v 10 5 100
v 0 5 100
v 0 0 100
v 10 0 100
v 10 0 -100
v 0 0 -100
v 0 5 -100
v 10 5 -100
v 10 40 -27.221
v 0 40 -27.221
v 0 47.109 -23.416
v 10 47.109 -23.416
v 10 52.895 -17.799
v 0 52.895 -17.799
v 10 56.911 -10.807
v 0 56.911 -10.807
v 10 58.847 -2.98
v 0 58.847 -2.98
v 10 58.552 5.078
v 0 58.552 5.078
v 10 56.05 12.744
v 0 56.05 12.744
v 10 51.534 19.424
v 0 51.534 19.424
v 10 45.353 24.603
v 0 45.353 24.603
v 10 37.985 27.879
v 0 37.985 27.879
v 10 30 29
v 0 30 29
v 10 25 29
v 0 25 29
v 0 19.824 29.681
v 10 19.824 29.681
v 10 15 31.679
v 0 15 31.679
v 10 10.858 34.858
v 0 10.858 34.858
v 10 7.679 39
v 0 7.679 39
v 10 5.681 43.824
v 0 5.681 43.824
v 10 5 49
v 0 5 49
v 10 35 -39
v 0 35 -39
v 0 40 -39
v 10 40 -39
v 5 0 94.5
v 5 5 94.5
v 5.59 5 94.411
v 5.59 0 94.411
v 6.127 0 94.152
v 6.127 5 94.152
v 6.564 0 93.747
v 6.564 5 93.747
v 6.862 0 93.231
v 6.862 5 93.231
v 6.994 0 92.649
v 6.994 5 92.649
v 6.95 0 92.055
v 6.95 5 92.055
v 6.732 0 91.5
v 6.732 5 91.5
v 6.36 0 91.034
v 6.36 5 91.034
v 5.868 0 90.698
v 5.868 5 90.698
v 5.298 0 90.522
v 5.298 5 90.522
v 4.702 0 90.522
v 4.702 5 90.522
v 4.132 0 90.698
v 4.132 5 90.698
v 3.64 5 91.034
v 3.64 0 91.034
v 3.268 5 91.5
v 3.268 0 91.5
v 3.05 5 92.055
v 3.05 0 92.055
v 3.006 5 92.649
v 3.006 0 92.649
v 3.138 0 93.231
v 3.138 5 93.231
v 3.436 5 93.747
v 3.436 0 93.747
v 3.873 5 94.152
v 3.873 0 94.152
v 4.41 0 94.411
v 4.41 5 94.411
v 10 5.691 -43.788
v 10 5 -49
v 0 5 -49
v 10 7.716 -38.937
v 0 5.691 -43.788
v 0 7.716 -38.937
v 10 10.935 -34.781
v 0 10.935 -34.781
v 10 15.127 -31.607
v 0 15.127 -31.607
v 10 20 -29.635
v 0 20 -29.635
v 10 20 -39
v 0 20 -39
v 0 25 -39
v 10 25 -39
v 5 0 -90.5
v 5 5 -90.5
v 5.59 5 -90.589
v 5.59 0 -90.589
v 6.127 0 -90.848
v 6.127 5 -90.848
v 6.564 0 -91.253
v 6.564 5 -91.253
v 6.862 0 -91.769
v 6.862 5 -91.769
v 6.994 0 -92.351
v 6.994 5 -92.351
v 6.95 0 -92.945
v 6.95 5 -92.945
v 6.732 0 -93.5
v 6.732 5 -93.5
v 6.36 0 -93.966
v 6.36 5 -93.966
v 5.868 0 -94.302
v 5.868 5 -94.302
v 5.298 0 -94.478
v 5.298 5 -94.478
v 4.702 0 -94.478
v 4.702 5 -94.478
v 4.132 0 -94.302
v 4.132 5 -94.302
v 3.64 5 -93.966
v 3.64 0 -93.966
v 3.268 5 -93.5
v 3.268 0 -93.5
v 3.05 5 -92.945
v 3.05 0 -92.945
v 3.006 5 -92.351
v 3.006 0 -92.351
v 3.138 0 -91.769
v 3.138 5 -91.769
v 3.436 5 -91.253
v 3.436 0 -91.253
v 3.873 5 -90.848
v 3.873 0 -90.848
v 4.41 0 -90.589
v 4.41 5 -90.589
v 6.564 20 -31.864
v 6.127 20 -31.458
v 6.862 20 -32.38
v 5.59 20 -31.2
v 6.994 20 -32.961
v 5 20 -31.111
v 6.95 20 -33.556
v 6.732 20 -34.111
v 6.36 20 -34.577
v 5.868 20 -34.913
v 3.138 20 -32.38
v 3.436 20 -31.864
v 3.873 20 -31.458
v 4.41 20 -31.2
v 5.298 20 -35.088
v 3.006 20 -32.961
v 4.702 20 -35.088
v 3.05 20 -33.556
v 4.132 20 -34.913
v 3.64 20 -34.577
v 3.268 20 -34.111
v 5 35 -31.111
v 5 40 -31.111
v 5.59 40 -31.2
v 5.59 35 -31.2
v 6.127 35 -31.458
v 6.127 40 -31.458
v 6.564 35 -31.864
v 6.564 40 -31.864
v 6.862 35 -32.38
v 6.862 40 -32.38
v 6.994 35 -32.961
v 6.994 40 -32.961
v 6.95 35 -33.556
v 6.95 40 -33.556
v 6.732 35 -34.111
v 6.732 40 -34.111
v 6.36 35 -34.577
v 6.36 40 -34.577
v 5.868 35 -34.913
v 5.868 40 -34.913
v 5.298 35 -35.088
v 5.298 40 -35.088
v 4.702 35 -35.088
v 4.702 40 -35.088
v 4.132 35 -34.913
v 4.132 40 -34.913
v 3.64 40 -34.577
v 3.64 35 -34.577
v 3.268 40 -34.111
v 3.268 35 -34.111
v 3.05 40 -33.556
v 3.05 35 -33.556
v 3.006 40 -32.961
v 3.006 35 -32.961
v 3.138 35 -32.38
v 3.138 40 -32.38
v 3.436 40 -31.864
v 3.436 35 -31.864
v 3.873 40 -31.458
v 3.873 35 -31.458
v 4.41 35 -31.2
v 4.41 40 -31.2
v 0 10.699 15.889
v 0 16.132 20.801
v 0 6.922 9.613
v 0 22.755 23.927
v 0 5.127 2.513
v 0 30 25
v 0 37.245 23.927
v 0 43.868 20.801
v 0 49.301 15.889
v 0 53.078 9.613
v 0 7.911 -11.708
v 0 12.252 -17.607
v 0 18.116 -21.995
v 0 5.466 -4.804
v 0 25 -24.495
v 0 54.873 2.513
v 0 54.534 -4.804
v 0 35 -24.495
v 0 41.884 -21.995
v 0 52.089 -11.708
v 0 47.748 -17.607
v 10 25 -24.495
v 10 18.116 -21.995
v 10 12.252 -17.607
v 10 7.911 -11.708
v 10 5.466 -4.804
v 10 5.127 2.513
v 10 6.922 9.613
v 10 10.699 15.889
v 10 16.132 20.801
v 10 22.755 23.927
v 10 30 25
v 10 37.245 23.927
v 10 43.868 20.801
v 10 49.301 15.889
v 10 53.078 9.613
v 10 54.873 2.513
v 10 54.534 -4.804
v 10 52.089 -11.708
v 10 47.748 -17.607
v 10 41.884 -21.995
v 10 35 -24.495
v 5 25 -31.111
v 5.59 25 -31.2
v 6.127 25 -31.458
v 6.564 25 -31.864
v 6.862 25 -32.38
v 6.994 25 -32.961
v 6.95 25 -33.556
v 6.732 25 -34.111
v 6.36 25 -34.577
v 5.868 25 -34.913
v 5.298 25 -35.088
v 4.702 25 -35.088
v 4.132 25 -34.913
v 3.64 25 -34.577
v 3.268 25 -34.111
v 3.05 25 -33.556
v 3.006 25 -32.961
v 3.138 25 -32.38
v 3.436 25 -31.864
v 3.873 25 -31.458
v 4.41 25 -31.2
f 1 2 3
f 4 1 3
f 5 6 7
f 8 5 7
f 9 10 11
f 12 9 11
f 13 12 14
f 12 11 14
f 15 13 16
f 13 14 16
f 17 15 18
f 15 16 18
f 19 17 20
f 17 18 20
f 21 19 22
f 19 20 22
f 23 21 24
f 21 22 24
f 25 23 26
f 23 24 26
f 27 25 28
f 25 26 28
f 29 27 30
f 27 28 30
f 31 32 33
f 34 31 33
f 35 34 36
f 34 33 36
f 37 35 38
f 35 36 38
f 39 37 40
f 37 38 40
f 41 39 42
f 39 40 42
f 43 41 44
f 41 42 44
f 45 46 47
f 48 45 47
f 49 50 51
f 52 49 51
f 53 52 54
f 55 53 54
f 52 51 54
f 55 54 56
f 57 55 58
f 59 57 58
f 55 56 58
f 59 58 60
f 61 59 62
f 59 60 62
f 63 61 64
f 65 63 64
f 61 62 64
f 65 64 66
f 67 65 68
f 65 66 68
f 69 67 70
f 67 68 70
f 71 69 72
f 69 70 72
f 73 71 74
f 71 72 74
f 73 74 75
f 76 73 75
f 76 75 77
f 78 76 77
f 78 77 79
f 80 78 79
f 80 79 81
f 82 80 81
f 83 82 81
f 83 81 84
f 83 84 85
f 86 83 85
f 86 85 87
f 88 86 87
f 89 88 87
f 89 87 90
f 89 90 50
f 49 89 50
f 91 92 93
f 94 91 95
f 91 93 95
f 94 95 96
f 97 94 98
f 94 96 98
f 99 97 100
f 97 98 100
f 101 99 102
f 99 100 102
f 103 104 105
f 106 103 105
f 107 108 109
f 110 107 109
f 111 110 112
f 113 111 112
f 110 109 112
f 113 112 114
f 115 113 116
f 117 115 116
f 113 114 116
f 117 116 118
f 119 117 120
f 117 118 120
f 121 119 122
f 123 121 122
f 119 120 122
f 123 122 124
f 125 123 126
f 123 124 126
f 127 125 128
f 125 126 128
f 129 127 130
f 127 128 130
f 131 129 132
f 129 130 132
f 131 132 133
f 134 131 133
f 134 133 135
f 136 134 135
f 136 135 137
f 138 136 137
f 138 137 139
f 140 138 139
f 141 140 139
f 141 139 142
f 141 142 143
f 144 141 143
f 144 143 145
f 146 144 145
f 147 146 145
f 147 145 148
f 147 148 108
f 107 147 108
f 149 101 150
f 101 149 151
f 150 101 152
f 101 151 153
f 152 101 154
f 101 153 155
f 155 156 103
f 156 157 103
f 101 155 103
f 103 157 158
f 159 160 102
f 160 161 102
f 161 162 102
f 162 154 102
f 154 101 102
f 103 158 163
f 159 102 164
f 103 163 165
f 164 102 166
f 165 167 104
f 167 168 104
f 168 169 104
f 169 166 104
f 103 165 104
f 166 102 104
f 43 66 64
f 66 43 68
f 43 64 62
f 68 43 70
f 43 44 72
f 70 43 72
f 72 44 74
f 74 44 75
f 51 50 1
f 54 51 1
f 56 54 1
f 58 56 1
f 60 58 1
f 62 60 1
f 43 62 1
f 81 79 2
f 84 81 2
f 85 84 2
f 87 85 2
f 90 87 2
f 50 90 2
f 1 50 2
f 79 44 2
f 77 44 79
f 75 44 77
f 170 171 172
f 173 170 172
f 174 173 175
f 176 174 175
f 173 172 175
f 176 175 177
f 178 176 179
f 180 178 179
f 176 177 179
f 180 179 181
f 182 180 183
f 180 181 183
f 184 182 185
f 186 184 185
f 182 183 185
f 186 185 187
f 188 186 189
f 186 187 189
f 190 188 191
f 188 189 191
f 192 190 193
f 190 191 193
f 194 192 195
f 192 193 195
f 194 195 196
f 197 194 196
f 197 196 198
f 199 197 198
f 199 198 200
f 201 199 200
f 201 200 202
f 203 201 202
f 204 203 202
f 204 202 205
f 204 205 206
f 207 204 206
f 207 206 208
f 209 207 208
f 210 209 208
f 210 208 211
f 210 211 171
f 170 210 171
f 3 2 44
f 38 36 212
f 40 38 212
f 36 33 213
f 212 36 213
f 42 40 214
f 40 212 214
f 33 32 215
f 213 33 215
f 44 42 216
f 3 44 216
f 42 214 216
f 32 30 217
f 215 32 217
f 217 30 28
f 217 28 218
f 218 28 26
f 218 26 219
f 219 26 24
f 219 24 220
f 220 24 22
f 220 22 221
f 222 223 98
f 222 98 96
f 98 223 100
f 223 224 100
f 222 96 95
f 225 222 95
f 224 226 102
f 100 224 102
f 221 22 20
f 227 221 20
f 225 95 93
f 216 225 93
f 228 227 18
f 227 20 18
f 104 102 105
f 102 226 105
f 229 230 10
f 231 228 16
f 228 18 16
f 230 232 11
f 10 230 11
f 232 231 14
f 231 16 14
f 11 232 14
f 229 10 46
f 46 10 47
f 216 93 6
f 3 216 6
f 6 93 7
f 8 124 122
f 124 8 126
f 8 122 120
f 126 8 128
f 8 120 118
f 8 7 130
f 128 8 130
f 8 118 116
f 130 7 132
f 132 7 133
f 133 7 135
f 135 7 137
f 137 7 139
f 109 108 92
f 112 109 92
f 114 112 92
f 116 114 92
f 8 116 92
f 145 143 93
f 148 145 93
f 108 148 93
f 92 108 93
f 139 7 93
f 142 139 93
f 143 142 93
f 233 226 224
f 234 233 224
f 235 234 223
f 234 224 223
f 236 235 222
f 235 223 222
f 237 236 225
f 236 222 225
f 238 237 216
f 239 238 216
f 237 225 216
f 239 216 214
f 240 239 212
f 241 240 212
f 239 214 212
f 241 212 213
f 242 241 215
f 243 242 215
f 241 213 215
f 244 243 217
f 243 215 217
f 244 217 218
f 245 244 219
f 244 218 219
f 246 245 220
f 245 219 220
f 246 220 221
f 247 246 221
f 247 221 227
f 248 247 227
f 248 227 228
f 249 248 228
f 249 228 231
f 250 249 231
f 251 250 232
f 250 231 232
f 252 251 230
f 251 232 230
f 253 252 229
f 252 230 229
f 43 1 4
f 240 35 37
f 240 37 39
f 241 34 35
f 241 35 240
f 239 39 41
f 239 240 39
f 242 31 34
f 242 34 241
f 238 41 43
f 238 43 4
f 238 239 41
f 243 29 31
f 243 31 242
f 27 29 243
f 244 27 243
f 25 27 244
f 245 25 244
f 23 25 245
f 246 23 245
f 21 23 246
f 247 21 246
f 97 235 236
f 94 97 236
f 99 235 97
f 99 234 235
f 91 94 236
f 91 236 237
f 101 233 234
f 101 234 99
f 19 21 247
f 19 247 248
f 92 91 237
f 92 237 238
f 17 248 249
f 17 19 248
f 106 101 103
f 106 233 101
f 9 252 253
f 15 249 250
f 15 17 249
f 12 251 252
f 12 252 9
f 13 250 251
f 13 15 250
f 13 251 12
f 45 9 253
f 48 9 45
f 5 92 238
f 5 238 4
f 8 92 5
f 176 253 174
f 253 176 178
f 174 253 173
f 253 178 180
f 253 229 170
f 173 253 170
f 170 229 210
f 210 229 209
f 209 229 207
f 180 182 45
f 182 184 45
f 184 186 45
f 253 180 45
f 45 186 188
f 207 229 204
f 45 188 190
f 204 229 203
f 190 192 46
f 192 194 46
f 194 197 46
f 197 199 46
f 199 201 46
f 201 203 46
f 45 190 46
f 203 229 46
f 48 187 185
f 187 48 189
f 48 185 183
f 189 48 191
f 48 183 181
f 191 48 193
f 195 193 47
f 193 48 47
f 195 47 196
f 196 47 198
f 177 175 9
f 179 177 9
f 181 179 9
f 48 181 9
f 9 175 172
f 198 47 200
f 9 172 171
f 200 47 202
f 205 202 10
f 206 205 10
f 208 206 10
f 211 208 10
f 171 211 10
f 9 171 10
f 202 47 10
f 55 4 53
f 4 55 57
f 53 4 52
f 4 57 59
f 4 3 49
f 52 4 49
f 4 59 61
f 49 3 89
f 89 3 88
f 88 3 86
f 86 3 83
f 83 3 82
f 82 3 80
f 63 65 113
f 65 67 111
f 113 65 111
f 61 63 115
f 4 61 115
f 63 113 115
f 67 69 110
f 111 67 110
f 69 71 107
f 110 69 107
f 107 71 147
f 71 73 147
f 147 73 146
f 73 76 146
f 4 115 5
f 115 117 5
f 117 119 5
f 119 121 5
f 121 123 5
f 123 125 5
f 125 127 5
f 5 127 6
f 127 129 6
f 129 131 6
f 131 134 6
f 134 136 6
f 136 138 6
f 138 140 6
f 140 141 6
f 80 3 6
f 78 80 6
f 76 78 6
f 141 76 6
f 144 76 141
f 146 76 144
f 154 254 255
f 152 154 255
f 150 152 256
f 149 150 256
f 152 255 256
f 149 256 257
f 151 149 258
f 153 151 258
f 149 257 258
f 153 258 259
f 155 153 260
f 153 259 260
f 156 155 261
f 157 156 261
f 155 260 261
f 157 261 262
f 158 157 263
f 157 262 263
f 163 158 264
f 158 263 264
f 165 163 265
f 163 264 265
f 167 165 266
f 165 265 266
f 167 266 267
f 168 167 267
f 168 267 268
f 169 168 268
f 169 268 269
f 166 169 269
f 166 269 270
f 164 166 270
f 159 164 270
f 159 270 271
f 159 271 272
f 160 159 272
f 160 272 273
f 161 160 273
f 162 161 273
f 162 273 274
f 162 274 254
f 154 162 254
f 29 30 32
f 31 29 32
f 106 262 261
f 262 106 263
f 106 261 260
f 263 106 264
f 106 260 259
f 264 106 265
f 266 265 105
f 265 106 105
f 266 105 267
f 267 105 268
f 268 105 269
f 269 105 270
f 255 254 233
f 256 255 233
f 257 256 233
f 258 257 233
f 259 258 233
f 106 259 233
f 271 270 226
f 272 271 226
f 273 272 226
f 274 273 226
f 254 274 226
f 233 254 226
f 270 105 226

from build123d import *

# Parameters (mm, degrees)
SALIENTE_EXTRUIR1_DEPTH = 10
CROQUIS4_R              = 2
CORTAR_EXTRUIR1_DEPTH   = 23
CROQUIS5_R              = 2
CORTAR_EXTRUIR2_DEPTH   = 23


with BuildPart() as part:
    # Croquis2 → Saliente-Extruir1 (new body)
    with BuildSketch(Plane(origin=(0, 0, 0), x_dir=(0, 0, -1), z_dir=(1, 0, 0))):
        with BuildLine():
            Line((-100, 5), (-100, 0))
            Line((-100, 0), (100, 0))
            Line((100, 0), (100, 5))
            Line((100, 5), (49, 5))
            ThreePointArc((49, 5), (36.752551286, 9.188611699), (29.635083269, 20))
            Line((29.635083269, 20), (39, 20))
            Line((39, 20), (39, 25))
            Line((39, 25), (24.494897428, 25))
            ThreePointArc((24.494897428, 25), (-25, 30), (24.494897428, 35))
            Line((24.494897428, 35), (39, 35))
            Line((39, 35), (39, 40))
            Line((39, 40), (27.221315178, 40))
            ThreePointArc((27.221315178, 40), (-5.078477126, 58.551866315), (-29, 30))
            Line((-29, 30), (-29, 25))
            ThreePointArc((-29, 25), (-34.857864376, 10.857864376), (-49, 5))
            Line((-49, 5), (-100, 5))
        make_face()
    extrude(amount=SALIENTE_EXTRUIR1_DEPTH)

    # Croquis4 → Cortar-Extruir1 (cut)
    with BuildSketch(Plane(origin=(0, 40, 0), x_dir=(1, 0, 0), z_dir=(0, 1, 0))):
        with Locations(Location((5, 33.110657589, 0), (0, 0, 270))):
            Circle(CROQUIS4_R)
    extrude(amount=-CORTAR_EXTRUIR1_DEPTH, mode=Mode.SUBTRACT)

    # Croquis5 → Cortar-Extruir2 (cut)
    with BuildSketch(Plane(origin=(0, 5, 0), x_dir=(1, 0, 0), z_dir=(0, 1, 0))):
        with Locations(Location((5, -92.5, 0), (0, 0, 270))):
            Circle(CROQUIS5_R)
        with Locations(Location((5, 92.5, 0), (0, 0, 270))):
            Circle(CROQUIS5_R)
    extrude(amount=-CORTAR_EXTRUIR2_DEPTH, mode=Mode.SUBTRACT)


solid = part.part
